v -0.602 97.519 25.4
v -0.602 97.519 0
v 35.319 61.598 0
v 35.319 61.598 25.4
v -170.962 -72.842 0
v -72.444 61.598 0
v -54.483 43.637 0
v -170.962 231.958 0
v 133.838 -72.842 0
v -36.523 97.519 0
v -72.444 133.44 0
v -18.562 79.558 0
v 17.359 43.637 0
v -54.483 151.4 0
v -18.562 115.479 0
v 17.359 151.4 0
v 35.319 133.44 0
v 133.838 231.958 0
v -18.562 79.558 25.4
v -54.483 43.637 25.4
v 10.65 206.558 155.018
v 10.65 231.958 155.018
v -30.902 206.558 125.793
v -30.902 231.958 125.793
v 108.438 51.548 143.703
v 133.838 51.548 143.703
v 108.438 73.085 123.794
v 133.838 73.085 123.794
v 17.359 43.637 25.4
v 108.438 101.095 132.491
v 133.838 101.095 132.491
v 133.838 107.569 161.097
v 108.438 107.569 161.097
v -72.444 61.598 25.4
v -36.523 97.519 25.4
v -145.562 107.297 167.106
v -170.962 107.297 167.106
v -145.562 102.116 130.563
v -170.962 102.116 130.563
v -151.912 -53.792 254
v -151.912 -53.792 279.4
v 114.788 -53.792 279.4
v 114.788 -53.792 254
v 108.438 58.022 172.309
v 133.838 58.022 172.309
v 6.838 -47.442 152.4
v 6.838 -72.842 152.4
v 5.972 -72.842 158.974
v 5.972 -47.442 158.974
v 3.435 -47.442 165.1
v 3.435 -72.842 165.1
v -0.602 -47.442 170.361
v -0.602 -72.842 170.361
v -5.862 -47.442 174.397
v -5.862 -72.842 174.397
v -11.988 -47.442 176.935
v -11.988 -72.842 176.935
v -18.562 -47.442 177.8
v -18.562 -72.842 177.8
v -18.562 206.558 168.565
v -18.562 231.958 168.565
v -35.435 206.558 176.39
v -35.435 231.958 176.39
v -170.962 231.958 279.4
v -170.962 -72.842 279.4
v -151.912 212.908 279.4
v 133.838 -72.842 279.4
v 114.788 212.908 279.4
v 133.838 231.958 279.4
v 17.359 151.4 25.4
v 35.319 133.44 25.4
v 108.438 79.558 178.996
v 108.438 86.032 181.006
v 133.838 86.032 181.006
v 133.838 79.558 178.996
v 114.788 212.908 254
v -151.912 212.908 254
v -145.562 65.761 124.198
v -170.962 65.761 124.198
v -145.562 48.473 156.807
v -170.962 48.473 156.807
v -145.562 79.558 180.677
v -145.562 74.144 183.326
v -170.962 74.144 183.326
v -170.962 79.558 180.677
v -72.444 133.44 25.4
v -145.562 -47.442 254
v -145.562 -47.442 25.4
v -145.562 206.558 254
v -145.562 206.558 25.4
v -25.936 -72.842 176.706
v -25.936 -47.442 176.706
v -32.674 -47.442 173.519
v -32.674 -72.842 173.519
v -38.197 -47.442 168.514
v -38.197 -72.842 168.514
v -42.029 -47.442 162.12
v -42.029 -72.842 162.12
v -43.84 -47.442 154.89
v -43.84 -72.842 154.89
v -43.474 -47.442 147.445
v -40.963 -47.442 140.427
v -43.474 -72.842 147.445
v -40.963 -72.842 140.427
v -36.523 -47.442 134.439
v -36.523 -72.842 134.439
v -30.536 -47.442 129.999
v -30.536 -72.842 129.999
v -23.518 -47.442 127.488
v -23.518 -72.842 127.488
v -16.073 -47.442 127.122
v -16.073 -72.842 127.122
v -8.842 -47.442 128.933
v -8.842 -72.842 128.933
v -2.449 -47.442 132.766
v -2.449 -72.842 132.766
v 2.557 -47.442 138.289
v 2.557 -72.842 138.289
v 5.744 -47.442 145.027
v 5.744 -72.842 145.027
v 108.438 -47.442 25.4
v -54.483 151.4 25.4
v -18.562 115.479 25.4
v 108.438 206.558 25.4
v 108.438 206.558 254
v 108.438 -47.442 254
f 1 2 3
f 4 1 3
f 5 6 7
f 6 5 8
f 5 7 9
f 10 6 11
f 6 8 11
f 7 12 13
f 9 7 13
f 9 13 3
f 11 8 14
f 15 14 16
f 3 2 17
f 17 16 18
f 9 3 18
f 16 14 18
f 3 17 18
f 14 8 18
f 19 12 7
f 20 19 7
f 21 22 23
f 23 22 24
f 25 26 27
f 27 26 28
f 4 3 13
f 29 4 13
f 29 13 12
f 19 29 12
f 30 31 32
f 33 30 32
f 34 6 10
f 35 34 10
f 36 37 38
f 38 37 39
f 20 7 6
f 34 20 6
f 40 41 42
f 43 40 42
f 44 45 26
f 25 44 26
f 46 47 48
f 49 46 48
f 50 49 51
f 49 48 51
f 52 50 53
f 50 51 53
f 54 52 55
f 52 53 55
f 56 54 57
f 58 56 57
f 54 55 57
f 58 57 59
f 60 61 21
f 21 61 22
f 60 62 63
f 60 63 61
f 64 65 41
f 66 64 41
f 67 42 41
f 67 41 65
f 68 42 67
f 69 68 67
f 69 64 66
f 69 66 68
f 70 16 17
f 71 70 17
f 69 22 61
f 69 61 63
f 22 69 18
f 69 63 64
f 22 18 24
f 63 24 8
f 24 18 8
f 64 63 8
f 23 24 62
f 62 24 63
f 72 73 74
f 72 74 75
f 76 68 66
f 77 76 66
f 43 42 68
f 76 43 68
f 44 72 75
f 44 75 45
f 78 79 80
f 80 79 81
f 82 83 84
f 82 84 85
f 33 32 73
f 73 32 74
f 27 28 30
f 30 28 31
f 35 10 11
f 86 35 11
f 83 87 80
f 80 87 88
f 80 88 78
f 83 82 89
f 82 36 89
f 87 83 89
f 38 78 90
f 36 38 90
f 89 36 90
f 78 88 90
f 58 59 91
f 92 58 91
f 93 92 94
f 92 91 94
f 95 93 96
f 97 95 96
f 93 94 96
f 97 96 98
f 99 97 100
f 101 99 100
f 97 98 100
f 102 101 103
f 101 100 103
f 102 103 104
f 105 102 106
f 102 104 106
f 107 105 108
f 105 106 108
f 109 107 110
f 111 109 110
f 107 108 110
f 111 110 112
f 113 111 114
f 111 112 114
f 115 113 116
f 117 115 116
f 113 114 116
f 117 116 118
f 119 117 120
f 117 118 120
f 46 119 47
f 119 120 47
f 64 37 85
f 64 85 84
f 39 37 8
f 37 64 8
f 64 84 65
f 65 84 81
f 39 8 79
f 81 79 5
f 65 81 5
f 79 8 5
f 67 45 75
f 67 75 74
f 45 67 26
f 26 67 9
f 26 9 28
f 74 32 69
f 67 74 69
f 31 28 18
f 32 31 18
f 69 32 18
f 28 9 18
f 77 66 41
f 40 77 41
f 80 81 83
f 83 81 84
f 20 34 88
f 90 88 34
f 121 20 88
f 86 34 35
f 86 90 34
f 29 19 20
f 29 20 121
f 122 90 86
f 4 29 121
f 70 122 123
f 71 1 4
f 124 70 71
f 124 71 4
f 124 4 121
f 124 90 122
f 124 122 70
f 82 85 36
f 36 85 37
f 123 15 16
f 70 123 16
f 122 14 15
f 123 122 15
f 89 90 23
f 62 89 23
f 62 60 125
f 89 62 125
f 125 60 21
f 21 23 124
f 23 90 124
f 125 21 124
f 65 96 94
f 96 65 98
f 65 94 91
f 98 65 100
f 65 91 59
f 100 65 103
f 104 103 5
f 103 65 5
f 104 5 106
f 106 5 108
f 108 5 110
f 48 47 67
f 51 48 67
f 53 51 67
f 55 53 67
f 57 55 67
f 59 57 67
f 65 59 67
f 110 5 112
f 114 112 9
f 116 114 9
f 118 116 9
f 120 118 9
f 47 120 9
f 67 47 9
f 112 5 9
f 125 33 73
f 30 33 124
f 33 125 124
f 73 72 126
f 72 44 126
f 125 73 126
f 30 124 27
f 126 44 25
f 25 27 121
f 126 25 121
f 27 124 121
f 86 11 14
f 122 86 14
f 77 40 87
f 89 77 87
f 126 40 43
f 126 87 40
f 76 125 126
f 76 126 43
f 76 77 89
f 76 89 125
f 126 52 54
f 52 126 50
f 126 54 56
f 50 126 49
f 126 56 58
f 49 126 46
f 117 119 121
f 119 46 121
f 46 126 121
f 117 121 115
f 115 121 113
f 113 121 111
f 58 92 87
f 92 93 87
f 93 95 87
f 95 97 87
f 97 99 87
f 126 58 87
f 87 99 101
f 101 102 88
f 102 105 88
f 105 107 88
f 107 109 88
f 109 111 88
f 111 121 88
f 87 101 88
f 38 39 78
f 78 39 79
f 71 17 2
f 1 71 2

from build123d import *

# Parameters (mm, degrees)
F0_W      = 304.8
F0_H      = 304.8
F1_DEPTH  = 25.4
F3_DEPTH  = 254
F5_DEPTH  = 25.4
F7_DEPTH  = 25.4
F9_DEPTH  = 25.4
F11_DEPTH = 25.4
F13_DEPTH = 25.4
F15_DEPTH = 25.4


with BuildPart() as f1:
    # F0 (on Top) → F1 (new body)
    with BuildSketch(Plane.XY):
        with Locations((-18.562319, 79.558338)):
            Rectangle(F0_W, F0_H)
    extrude(amount=F1_DEPTH)

    # F2 (on face) → F3 (join)
    with BuildSketch(Plane.XY.offset(25.4)):
        Polygon((-145.562319, 231.958338), (-170.962319, 231.958338), (-170.962319, -72.841662), (108.437681, -72.841662), (108.437681, -47.441662), (-145.562319, -47.441662), (-145.562319, 206.558338), align=None)
        Polygon((133.837681, 231.958338), (-145.562319, 231.958338), (-145.562319, 206.558338), (108.437681, 206.558338), (108.437681, -47.441662), (108.437681, -72.841662), (133.837681, -72.841662), align=None)
    extrude(amount=F3_DEPTH)

    # F4 (on face) → F5 (cut)
    with BuildSketch(Plane.XY.offset(279.4)):
        Polygon((-145.562319, 212.908338), (-145.562319, 206.558338), (108.437681, 206.558338), (108.437681, -47.441662), (108.437681, -53.791662), (114.787681, -53.791662), (114.787681, 212.908338), align=None)
        Polygon((-145.562319, -47.441662), (-145.562319, 206.558338), (-145.562319, 212.908338), (-151.912319, 212.908338), (-151.912319, -53.791662), (108.437681, -53.791662), (108.437681, -47.441662), align=None)
    extrude(amount=-F5_DEPTH, mode=Mode.SUBTRACT)

    # F6 (on face) → F7 (cut)
    with BuildSketch(Plane.XZ.offset(72.841662)):
        with BuildLine():
            ThreePointArc((6.837681, 152.4), (-0.601807, 170.360512), (-18.562319, 177.8))
            ThreePointArc((-18.562319, 177.8), (-36.522831, 134.439488), (6.837681, 152.4))
        make_face()
    extrude(amount=-F7_DEPTH, mode=Mode.SUBTRACT)

    # F8 (on face) → F9 (cut)
    with BuildSketch(Plane.YZ.offset(133.837681)):
        Polygon((86.032008, 181.00603), (79.558338, 178.996087), (58.021625, 172.309378), (51.547955, 143.703348), (73.084668, 123.79397), (101.095051, 132.490622), (107.568721, 161.096652), align=None)
    extrude(amount=-F9_DEPTH, mode=Mode.SUBTRACT)

    # F10 (on face) → F11 (cut)
    with BuildSketch(Plane(origin=(0, 231.958338, 0), x_dir=(-1, 0, 0), z_dir=(0, 1, 0))):
        Polygon((35.435384, 176.389852), (18.562319, 168.564909), (-10.650035, 155.017578), (30.901607, 125.792571), align=None)
    extrude(amount=-F11_DEPTH, mode=Mode.SUBTRACT)

    # F12 (on face) → F13 (cut)
    with BuildSketch(Plane(origin=(0, 0, 0), x_dir=(1, 0, 0), z_dir=(0, 0, -1))):
        Polygon((17.358706, -43.637314), (-18.562319, -79.558338), (-54.483343, -43.637314), (-72.443855, -61.597826), (-36.522831, -97.51885), (-72.443855, -133.439875), (-54.483343, -151.400387), (-18.562319, -115.479363), (17.358706, -151.400387), (35.319218, -133.439875), (-0.601807, -97.51885), (35.319218, -61.597826), align=None)
    extrude(amount=-F13_DEPTH, mode=Mode.SUBTRACT)

    # F14 (on face) → F15 (cut)
    with BuildSketch(Plane(origin=(-170.962319, 0, 0), x_dir=(0, -1, 0), z_dir=(-1, 0, 0))):
        Polygon((-74.14409, 183.325761), (-79.558338, 180.676894), (-107.29739, 167.105841), (-102.116263, 130.562949), (-65.76085, 124.198119), (-48.473097, 156.80733), align=None)
    extrude(amount=-F15_DEPTH, mode=Mode.SUBTRACT)


solid = f1.part
